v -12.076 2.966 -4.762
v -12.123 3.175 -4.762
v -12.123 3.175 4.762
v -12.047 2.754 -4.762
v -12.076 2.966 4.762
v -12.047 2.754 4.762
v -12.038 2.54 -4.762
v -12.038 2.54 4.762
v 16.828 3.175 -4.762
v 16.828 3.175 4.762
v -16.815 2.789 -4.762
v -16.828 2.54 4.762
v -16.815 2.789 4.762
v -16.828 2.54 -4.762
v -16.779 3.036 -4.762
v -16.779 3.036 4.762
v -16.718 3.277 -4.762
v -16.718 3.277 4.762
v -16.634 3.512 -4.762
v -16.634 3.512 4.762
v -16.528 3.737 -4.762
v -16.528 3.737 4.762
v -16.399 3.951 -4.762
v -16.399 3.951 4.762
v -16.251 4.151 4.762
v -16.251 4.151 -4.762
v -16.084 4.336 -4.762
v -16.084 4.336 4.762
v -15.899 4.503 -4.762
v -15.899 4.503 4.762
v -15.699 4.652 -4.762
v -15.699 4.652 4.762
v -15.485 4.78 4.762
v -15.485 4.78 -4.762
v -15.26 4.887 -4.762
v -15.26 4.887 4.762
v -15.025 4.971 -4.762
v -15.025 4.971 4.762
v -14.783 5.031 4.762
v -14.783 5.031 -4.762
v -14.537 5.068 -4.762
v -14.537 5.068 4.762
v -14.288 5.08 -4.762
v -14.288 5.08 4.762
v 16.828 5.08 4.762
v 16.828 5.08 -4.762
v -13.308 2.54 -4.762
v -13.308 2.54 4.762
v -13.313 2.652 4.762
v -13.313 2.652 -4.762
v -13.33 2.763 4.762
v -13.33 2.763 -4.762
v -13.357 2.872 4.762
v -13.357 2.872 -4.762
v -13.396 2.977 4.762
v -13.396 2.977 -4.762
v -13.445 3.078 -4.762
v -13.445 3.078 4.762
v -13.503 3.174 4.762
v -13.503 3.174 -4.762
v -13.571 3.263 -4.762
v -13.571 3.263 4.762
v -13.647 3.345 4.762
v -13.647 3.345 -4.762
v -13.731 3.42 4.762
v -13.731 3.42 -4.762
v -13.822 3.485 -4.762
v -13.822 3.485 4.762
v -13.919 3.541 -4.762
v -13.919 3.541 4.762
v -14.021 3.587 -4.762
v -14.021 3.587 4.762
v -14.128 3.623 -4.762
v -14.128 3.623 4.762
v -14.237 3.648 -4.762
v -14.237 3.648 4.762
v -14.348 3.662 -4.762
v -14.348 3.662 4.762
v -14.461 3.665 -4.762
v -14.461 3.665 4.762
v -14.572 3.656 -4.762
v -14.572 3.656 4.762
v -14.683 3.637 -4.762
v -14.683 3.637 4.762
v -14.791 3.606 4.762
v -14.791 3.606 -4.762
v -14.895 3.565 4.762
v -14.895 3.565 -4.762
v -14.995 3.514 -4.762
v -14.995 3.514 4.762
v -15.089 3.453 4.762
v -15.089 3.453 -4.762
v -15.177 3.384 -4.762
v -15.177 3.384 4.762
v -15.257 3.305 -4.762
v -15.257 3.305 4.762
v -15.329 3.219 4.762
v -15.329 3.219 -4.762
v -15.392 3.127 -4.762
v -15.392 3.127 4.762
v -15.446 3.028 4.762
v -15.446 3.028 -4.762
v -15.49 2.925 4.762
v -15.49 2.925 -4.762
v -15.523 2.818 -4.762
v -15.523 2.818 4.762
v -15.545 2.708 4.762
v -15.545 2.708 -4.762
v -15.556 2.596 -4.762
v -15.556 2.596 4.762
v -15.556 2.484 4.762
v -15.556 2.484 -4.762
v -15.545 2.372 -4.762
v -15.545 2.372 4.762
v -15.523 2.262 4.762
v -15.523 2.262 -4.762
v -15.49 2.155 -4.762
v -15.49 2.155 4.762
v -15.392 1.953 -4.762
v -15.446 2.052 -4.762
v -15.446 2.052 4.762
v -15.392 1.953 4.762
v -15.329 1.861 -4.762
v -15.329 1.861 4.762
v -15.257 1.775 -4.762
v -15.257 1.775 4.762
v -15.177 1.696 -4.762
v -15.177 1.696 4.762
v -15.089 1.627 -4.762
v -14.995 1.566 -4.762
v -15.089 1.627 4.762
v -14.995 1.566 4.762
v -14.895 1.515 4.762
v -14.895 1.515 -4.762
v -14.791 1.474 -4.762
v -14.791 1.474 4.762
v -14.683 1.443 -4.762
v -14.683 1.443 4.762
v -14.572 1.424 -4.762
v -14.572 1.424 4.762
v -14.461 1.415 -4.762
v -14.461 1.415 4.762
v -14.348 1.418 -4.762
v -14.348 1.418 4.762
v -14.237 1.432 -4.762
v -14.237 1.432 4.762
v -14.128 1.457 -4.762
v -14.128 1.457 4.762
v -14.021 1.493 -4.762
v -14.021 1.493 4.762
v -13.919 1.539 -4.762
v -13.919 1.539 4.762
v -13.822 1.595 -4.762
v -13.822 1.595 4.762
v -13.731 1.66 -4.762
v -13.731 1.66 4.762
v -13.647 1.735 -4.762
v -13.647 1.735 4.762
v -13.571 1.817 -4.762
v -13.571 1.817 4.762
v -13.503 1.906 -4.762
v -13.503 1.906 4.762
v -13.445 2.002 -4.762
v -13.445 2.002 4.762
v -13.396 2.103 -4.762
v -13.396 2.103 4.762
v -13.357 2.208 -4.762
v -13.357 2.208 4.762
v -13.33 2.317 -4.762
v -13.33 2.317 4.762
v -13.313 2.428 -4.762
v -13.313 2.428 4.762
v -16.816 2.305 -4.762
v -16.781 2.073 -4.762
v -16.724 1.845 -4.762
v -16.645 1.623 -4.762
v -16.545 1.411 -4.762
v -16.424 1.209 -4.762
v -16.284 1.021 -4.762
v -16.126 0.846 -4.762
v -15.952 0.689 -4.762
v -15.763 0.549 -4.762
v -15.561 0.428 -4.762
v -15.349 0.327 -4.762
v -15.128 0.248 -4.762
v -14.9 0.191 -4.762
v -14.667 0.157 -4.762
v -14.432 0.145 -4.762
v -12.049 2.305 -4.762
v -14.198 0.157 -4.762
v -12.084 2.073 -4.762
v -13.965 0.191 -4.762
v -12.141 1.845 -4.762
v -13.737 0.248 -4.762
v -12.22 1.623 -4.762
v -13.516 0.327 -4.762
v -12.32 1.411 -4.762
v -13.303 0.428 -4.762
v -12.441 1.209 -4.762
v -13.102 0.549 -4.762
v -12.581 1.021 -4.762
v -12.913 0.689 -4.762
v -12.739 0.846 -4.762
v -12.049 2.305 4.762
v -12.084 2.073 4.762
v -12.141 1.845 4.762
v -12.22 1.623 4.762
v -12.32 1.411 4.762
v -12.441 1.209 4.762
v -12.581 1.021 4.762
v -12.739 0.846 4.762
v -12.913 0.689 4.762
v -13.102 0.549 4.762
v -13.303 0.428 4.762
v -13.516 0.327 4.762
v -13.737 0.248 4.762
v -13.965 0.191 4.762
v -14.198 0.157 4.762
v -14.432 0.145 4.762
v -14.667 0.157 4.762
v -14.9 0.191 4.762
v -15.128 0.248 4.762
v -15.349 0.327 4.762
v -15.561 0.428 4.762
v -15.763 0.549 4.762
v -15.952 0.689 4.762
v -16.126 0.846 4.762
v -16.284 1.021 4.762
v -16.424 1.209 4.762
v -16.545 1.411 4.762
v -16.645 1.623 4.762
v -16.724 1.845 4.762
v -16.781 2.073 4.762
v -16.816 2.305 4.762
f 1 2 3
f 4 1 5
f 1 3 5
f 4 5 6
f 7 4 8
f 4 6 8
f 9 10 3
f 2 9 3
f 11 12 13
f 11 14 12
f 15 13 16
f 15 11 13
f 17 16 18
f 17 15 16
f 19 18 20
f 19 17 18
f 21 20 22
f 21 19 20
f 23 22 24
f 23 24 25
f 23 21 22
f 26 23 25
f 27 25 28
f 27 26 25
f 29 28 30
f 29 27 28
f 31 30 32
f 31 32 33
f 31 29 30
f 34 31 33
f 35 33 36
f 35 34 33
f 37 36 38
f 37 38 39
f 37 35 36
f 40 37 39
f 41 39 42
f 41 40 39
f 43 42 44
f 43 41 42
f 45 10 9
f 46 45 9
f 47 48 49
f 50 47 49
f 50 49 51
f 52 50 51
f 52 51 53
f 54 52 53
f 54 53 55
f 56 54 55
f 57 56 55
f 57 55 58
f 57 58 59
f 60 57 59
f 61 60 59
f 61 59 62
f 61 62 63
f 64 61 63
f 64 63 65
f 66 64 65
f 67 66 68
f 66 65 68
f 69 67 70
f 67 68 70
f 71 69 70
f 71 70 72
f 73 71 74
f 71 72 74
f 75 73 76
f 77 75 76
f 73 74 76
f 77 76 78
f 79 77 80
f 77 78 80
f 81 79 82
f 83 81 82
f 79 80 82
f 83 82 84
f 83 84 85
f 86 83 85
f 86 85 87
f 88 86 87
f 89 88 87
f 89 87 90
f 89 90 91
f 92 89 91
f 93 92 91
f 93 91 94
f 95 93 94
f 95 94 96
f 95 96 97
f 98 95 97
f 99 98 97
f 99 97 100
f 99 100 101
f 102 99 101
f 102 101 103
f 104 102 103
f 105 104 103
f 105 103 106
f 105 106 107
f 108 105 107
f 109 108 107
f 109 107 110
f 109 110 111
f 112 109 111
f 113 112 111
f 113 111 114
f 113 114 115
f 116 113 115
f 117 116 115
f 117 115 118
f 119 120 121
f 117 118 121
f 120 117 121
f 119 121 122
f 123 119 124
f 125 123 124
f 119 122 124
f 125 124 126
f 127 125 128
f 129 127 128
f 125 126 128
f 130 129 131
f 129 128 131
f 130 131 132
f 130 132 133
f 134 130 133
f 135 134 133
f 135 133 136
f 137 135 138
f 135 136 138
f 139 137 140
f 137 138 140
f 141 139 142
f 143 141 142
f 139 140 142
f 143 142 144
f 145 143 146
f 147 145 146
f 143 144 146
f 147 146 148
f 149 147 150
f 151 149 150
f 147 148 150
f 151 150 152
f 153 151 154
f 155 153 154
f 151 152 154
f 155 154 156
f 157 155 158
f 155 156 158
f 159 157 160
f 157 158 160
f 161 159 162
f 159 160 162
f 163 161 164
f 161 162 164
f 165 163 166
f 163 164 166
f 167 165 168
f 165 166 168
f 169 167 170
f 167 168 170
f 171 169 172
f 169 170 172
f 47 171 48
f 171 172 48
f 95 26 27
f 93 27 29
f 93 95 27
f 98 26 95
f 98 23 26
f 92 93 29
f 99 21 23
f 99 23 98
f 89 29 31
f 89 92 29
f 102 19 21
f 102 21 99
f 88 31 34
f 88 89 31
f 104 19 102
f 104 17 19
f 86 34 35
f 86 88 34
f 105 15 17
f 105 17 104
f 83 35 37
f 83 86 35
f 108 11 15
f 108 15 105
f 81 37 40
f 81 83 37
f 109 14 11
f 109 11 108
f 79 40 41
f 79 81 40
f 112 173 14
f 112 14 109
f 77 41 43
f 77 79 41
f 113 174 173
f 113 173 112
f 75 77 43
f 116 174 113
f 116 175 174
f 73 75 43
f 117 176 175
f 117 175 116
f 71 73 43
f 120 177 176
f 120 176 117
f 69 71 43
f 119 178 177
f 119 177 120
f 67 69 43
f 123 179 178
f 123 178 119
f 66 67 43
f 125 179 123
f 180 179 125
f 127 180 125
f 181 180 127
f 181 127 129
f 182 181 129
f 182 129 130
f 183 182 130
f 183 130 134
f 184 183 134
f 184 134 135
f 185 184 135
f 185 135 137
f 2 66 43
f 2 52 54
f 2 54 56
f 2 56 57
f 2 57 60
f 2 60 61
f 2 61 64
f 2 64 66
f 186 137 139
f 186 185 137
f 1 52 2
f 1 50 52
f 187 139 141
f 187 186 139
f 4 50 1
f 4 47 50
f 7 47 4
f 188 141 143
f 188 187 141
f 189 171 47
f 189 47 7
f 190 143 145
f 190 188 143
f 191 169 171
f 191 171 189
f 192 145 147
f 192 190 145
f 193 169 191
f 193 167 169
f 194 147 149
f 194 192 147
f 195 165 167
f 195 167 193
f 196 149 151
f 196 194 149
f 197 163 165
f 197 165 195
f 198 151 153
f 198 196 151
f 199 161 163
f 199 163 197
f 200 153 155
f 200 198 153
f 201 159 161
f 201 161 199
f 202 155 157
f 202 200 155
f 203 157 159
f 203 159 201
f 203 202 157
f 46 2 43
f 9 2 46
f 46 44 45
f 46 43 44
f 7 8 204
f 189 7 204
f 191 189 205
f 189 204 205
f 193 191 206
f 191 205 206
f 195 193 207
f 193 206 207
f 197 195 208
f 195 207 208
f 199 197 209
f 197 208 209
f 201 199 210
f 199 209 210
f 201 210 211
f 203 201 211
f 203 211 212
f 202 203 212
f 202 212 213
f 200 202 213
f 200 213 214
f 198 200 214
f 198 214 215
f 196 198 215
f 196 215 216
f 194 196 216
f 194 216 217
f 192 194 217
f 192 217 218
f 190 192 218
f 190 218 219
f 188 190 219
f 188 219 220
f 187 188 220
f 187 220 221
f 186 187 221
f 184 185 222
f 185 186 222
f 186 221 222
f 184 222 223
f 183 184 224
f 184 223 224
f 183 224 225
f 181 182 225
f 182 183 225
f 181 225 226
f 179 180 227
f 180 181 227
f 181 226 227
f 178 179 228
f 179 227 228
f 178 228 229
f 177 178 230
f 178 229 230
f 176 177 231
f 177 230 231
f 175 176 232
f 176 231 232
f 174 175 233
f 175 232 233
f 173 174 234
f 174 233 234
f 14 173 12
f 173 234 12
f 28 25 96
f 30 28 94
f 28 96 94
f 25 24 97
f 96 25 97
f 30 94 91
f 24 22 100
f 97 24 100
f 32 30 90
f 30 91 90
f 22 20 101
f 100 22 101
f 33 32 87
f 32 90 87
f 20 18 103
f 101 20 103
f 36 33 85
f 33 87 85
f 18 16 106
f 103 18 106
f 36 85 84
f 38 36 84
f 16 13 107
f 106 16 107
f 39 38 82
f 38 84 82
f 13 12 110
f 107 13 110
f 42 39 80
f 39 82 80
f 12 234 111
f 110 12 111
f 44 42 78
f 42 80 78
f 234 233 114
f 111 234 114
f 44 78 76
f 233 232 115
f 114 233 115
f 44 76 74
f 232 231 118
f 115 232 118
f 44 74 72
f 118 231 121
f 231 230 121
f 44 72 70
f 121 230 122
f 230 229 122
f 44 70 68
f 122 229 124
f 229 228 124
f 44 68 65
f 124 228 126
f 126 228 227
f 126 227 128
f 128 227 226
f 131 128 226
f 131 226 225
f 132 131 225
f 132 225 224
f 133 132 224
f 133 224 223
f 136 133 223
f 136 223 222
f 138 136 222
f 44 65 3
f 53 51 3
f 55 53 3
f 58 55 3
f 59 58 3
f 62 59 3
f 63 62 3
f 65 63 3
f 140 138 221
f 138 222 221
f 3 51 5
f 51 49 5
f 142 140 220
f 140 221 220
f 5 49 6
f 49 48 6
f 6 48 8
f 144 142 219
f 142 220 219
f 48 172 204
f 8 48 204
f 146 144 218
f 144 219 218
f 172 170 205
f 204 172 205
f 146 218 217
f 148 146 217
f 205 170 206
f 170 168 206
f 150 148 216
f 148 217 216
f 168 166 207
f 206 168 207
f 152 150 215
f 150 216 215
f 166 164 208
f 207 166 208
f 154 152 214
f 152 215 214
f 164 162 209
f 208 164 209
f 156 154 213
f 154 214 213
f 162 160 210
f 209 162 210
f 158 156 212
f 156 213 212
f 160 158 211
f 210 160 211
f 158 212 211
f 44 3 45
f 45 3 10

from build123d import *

# Parameters (mm, degrees)
SKETCH1_W           = 33.655
SKETCH1_H           = 9.525
BOSS_EXTRUDE1_DEPTH = 5.08
SKETCH4_R           = 1.125
CUT_EXTRUDE2_DEPTH  = 20.992418094
FILLET1_R           = 2.54
CUT_EXTRUDE3_DEPTH  = 20.992418094


with BuildPart() as part:
    # Sketch1 → Boss-Extrude1 (new body)
    with BuildSketch(Plane(origin=(0, 0, 0), x_dir=(1, 0, 0), z_dir=(0, 1, 0))):
        Rectangle(SKETCH1_W, SKETCH1_H)
    extrude(amount=BOSS_EXTRUDE1_DEPTH)

    # Sketch4 → Cut-Extrude2 (cut, through all)
    with BuildSketch(Plane.XY.offset(4.7625)):
        with Locations((-14.4325, 2.54)):
            Circle(SKETCH4_R)
    extrude(amount=-CUT_EXTRUDE2_DEPTH, mode=Mode.SUBTRACT)

    # Fillet1
    fillet1_edges = [part.edges().sort_by_distance(p)[0] for p in [
        (-16.8275, 0, 0),
        (-16.8275, 5.08, 0),
    ]]
    fillet(fillet1_edges, radius=FILLET1_R - 0.0001)  # a hair under: the kernel refuses the full size

    # Sketch5 → Cut-Extrude3 (cut, through all)
    with BuildSketch(Plane.XY.offset(4.7625)):
        with BuildLine():
            Line((16.8275, 0), (16.8275, 3.175))
            Line((16.8275, 3.175), (-12.123214396, 3.175))
            ThreePointArc((-12.123214396, 3.175), (-12.05902533, 2.860379446), (-12.0375, 2.54))
            ThreePointArc((-12.0375, 2.54), (-14.4325, 0.145), (-16.8275, 2.54))
            ThreePointArc((-16.8275, 2.54), (-16.083551224, 0.743948776), (-14.2875, 0))
            Line((-14.2875, 0), (16.8275, 0))
        make_face()
    extrude(amount=-CUT_EXTRUDE3_DEPTH, mode=Mode.SUBTRACT)


with BuildPart() as cut_extrude3_kept_piece:
    # of the separate pieces the step leaves, the one the design keeps (cut_extrude3_pieces_kept)
    add(part.part.solids().sort_by_distance((-16.8275, 2.5401, -4.7625))[0])


solid = cut_extrude3_kept_piece.part
